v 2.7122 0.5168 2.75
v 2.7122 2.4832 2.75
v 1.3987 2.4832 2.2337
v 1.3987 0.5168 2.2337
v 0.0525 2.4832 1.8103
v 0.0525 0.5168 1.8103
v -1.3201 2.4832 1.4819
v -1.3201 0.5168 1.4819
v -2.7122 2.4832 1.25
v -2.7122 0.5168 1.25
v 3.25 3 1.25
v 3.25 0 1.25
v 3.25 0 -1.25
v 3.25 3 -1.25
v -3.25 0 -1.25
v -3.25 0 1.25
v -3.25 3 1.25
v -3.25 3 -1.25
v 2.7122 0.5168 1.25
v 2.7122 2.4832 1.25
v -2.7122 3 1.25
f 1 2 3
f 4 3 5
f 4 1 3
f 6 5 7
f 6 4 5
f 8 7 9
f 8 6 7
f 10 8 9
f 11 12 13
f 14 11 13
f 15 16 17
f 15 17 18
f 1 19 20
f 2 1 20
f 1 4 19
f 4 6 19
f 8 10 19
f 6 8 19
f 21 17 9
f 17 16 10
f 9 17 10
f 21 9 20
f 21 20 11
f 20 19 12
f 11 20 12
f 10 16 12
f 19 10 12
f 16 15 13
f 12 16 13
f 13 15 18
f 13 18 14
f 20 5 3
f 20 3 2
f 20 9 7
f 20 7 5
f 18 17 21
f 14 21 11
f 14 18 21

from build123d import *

# Parameters (mm, degrees)
SKETCH1_W           = 6.5
SKETCH1_H           = 2.5
BOSS_EXTRUDE1_DEPTH = 3
SKETCH2_W           = 5.424331786
SKETCH2_H           = 1.966345426
BOSS_EXTRUDE2_DEPTH = 1.5
CUT_EXTRUDE1_DEPTH  = 3.483172713


with BuildPart() as part:
    # Sketch1 → Boss-Extrude1 (new body)
    with BuildSketch(Plane(origin=(0, 0, 0), x_dir=(1, 0, 0), z_dir=(0, 1, 0))):
        Rectangle(SKETCH1_W, SKETCH1_H)
    extrude(amount=BOSS_EXTRUDE1_DEPTH)

    # Sketch2 → Boss-Extrude2 (add)
    with BuildSketch(Plane.XY.offset(1.25)):
        with Locations((0, 1.5)):
            Rectangle(SKETCH2_W, SKETCH2_H)
    extrude(amount=BOSS_EXTRUDE2_DEPTH)

    # Sketch4 → Cut-Extrude1 (cut, through all)
    with BuildSketch(Plane.XZ.offset(-0.516827287)):
        with BuildLine():
            Line((-2.712165893, 2.75), (2.712165893, 2.75))
            ThreePointArc((2.712165893, 2.75), (0.052459338, 1.810295429), (-2.712165893, 1.25))
            Line((-2.712165893, 1.25), (-2.712165893, 2.75))
        make_face()
    extrude(amount=-CUT_EXTRUDE1_DEPTH, mode=Mode.SUBTRACT)


solid = part.part
